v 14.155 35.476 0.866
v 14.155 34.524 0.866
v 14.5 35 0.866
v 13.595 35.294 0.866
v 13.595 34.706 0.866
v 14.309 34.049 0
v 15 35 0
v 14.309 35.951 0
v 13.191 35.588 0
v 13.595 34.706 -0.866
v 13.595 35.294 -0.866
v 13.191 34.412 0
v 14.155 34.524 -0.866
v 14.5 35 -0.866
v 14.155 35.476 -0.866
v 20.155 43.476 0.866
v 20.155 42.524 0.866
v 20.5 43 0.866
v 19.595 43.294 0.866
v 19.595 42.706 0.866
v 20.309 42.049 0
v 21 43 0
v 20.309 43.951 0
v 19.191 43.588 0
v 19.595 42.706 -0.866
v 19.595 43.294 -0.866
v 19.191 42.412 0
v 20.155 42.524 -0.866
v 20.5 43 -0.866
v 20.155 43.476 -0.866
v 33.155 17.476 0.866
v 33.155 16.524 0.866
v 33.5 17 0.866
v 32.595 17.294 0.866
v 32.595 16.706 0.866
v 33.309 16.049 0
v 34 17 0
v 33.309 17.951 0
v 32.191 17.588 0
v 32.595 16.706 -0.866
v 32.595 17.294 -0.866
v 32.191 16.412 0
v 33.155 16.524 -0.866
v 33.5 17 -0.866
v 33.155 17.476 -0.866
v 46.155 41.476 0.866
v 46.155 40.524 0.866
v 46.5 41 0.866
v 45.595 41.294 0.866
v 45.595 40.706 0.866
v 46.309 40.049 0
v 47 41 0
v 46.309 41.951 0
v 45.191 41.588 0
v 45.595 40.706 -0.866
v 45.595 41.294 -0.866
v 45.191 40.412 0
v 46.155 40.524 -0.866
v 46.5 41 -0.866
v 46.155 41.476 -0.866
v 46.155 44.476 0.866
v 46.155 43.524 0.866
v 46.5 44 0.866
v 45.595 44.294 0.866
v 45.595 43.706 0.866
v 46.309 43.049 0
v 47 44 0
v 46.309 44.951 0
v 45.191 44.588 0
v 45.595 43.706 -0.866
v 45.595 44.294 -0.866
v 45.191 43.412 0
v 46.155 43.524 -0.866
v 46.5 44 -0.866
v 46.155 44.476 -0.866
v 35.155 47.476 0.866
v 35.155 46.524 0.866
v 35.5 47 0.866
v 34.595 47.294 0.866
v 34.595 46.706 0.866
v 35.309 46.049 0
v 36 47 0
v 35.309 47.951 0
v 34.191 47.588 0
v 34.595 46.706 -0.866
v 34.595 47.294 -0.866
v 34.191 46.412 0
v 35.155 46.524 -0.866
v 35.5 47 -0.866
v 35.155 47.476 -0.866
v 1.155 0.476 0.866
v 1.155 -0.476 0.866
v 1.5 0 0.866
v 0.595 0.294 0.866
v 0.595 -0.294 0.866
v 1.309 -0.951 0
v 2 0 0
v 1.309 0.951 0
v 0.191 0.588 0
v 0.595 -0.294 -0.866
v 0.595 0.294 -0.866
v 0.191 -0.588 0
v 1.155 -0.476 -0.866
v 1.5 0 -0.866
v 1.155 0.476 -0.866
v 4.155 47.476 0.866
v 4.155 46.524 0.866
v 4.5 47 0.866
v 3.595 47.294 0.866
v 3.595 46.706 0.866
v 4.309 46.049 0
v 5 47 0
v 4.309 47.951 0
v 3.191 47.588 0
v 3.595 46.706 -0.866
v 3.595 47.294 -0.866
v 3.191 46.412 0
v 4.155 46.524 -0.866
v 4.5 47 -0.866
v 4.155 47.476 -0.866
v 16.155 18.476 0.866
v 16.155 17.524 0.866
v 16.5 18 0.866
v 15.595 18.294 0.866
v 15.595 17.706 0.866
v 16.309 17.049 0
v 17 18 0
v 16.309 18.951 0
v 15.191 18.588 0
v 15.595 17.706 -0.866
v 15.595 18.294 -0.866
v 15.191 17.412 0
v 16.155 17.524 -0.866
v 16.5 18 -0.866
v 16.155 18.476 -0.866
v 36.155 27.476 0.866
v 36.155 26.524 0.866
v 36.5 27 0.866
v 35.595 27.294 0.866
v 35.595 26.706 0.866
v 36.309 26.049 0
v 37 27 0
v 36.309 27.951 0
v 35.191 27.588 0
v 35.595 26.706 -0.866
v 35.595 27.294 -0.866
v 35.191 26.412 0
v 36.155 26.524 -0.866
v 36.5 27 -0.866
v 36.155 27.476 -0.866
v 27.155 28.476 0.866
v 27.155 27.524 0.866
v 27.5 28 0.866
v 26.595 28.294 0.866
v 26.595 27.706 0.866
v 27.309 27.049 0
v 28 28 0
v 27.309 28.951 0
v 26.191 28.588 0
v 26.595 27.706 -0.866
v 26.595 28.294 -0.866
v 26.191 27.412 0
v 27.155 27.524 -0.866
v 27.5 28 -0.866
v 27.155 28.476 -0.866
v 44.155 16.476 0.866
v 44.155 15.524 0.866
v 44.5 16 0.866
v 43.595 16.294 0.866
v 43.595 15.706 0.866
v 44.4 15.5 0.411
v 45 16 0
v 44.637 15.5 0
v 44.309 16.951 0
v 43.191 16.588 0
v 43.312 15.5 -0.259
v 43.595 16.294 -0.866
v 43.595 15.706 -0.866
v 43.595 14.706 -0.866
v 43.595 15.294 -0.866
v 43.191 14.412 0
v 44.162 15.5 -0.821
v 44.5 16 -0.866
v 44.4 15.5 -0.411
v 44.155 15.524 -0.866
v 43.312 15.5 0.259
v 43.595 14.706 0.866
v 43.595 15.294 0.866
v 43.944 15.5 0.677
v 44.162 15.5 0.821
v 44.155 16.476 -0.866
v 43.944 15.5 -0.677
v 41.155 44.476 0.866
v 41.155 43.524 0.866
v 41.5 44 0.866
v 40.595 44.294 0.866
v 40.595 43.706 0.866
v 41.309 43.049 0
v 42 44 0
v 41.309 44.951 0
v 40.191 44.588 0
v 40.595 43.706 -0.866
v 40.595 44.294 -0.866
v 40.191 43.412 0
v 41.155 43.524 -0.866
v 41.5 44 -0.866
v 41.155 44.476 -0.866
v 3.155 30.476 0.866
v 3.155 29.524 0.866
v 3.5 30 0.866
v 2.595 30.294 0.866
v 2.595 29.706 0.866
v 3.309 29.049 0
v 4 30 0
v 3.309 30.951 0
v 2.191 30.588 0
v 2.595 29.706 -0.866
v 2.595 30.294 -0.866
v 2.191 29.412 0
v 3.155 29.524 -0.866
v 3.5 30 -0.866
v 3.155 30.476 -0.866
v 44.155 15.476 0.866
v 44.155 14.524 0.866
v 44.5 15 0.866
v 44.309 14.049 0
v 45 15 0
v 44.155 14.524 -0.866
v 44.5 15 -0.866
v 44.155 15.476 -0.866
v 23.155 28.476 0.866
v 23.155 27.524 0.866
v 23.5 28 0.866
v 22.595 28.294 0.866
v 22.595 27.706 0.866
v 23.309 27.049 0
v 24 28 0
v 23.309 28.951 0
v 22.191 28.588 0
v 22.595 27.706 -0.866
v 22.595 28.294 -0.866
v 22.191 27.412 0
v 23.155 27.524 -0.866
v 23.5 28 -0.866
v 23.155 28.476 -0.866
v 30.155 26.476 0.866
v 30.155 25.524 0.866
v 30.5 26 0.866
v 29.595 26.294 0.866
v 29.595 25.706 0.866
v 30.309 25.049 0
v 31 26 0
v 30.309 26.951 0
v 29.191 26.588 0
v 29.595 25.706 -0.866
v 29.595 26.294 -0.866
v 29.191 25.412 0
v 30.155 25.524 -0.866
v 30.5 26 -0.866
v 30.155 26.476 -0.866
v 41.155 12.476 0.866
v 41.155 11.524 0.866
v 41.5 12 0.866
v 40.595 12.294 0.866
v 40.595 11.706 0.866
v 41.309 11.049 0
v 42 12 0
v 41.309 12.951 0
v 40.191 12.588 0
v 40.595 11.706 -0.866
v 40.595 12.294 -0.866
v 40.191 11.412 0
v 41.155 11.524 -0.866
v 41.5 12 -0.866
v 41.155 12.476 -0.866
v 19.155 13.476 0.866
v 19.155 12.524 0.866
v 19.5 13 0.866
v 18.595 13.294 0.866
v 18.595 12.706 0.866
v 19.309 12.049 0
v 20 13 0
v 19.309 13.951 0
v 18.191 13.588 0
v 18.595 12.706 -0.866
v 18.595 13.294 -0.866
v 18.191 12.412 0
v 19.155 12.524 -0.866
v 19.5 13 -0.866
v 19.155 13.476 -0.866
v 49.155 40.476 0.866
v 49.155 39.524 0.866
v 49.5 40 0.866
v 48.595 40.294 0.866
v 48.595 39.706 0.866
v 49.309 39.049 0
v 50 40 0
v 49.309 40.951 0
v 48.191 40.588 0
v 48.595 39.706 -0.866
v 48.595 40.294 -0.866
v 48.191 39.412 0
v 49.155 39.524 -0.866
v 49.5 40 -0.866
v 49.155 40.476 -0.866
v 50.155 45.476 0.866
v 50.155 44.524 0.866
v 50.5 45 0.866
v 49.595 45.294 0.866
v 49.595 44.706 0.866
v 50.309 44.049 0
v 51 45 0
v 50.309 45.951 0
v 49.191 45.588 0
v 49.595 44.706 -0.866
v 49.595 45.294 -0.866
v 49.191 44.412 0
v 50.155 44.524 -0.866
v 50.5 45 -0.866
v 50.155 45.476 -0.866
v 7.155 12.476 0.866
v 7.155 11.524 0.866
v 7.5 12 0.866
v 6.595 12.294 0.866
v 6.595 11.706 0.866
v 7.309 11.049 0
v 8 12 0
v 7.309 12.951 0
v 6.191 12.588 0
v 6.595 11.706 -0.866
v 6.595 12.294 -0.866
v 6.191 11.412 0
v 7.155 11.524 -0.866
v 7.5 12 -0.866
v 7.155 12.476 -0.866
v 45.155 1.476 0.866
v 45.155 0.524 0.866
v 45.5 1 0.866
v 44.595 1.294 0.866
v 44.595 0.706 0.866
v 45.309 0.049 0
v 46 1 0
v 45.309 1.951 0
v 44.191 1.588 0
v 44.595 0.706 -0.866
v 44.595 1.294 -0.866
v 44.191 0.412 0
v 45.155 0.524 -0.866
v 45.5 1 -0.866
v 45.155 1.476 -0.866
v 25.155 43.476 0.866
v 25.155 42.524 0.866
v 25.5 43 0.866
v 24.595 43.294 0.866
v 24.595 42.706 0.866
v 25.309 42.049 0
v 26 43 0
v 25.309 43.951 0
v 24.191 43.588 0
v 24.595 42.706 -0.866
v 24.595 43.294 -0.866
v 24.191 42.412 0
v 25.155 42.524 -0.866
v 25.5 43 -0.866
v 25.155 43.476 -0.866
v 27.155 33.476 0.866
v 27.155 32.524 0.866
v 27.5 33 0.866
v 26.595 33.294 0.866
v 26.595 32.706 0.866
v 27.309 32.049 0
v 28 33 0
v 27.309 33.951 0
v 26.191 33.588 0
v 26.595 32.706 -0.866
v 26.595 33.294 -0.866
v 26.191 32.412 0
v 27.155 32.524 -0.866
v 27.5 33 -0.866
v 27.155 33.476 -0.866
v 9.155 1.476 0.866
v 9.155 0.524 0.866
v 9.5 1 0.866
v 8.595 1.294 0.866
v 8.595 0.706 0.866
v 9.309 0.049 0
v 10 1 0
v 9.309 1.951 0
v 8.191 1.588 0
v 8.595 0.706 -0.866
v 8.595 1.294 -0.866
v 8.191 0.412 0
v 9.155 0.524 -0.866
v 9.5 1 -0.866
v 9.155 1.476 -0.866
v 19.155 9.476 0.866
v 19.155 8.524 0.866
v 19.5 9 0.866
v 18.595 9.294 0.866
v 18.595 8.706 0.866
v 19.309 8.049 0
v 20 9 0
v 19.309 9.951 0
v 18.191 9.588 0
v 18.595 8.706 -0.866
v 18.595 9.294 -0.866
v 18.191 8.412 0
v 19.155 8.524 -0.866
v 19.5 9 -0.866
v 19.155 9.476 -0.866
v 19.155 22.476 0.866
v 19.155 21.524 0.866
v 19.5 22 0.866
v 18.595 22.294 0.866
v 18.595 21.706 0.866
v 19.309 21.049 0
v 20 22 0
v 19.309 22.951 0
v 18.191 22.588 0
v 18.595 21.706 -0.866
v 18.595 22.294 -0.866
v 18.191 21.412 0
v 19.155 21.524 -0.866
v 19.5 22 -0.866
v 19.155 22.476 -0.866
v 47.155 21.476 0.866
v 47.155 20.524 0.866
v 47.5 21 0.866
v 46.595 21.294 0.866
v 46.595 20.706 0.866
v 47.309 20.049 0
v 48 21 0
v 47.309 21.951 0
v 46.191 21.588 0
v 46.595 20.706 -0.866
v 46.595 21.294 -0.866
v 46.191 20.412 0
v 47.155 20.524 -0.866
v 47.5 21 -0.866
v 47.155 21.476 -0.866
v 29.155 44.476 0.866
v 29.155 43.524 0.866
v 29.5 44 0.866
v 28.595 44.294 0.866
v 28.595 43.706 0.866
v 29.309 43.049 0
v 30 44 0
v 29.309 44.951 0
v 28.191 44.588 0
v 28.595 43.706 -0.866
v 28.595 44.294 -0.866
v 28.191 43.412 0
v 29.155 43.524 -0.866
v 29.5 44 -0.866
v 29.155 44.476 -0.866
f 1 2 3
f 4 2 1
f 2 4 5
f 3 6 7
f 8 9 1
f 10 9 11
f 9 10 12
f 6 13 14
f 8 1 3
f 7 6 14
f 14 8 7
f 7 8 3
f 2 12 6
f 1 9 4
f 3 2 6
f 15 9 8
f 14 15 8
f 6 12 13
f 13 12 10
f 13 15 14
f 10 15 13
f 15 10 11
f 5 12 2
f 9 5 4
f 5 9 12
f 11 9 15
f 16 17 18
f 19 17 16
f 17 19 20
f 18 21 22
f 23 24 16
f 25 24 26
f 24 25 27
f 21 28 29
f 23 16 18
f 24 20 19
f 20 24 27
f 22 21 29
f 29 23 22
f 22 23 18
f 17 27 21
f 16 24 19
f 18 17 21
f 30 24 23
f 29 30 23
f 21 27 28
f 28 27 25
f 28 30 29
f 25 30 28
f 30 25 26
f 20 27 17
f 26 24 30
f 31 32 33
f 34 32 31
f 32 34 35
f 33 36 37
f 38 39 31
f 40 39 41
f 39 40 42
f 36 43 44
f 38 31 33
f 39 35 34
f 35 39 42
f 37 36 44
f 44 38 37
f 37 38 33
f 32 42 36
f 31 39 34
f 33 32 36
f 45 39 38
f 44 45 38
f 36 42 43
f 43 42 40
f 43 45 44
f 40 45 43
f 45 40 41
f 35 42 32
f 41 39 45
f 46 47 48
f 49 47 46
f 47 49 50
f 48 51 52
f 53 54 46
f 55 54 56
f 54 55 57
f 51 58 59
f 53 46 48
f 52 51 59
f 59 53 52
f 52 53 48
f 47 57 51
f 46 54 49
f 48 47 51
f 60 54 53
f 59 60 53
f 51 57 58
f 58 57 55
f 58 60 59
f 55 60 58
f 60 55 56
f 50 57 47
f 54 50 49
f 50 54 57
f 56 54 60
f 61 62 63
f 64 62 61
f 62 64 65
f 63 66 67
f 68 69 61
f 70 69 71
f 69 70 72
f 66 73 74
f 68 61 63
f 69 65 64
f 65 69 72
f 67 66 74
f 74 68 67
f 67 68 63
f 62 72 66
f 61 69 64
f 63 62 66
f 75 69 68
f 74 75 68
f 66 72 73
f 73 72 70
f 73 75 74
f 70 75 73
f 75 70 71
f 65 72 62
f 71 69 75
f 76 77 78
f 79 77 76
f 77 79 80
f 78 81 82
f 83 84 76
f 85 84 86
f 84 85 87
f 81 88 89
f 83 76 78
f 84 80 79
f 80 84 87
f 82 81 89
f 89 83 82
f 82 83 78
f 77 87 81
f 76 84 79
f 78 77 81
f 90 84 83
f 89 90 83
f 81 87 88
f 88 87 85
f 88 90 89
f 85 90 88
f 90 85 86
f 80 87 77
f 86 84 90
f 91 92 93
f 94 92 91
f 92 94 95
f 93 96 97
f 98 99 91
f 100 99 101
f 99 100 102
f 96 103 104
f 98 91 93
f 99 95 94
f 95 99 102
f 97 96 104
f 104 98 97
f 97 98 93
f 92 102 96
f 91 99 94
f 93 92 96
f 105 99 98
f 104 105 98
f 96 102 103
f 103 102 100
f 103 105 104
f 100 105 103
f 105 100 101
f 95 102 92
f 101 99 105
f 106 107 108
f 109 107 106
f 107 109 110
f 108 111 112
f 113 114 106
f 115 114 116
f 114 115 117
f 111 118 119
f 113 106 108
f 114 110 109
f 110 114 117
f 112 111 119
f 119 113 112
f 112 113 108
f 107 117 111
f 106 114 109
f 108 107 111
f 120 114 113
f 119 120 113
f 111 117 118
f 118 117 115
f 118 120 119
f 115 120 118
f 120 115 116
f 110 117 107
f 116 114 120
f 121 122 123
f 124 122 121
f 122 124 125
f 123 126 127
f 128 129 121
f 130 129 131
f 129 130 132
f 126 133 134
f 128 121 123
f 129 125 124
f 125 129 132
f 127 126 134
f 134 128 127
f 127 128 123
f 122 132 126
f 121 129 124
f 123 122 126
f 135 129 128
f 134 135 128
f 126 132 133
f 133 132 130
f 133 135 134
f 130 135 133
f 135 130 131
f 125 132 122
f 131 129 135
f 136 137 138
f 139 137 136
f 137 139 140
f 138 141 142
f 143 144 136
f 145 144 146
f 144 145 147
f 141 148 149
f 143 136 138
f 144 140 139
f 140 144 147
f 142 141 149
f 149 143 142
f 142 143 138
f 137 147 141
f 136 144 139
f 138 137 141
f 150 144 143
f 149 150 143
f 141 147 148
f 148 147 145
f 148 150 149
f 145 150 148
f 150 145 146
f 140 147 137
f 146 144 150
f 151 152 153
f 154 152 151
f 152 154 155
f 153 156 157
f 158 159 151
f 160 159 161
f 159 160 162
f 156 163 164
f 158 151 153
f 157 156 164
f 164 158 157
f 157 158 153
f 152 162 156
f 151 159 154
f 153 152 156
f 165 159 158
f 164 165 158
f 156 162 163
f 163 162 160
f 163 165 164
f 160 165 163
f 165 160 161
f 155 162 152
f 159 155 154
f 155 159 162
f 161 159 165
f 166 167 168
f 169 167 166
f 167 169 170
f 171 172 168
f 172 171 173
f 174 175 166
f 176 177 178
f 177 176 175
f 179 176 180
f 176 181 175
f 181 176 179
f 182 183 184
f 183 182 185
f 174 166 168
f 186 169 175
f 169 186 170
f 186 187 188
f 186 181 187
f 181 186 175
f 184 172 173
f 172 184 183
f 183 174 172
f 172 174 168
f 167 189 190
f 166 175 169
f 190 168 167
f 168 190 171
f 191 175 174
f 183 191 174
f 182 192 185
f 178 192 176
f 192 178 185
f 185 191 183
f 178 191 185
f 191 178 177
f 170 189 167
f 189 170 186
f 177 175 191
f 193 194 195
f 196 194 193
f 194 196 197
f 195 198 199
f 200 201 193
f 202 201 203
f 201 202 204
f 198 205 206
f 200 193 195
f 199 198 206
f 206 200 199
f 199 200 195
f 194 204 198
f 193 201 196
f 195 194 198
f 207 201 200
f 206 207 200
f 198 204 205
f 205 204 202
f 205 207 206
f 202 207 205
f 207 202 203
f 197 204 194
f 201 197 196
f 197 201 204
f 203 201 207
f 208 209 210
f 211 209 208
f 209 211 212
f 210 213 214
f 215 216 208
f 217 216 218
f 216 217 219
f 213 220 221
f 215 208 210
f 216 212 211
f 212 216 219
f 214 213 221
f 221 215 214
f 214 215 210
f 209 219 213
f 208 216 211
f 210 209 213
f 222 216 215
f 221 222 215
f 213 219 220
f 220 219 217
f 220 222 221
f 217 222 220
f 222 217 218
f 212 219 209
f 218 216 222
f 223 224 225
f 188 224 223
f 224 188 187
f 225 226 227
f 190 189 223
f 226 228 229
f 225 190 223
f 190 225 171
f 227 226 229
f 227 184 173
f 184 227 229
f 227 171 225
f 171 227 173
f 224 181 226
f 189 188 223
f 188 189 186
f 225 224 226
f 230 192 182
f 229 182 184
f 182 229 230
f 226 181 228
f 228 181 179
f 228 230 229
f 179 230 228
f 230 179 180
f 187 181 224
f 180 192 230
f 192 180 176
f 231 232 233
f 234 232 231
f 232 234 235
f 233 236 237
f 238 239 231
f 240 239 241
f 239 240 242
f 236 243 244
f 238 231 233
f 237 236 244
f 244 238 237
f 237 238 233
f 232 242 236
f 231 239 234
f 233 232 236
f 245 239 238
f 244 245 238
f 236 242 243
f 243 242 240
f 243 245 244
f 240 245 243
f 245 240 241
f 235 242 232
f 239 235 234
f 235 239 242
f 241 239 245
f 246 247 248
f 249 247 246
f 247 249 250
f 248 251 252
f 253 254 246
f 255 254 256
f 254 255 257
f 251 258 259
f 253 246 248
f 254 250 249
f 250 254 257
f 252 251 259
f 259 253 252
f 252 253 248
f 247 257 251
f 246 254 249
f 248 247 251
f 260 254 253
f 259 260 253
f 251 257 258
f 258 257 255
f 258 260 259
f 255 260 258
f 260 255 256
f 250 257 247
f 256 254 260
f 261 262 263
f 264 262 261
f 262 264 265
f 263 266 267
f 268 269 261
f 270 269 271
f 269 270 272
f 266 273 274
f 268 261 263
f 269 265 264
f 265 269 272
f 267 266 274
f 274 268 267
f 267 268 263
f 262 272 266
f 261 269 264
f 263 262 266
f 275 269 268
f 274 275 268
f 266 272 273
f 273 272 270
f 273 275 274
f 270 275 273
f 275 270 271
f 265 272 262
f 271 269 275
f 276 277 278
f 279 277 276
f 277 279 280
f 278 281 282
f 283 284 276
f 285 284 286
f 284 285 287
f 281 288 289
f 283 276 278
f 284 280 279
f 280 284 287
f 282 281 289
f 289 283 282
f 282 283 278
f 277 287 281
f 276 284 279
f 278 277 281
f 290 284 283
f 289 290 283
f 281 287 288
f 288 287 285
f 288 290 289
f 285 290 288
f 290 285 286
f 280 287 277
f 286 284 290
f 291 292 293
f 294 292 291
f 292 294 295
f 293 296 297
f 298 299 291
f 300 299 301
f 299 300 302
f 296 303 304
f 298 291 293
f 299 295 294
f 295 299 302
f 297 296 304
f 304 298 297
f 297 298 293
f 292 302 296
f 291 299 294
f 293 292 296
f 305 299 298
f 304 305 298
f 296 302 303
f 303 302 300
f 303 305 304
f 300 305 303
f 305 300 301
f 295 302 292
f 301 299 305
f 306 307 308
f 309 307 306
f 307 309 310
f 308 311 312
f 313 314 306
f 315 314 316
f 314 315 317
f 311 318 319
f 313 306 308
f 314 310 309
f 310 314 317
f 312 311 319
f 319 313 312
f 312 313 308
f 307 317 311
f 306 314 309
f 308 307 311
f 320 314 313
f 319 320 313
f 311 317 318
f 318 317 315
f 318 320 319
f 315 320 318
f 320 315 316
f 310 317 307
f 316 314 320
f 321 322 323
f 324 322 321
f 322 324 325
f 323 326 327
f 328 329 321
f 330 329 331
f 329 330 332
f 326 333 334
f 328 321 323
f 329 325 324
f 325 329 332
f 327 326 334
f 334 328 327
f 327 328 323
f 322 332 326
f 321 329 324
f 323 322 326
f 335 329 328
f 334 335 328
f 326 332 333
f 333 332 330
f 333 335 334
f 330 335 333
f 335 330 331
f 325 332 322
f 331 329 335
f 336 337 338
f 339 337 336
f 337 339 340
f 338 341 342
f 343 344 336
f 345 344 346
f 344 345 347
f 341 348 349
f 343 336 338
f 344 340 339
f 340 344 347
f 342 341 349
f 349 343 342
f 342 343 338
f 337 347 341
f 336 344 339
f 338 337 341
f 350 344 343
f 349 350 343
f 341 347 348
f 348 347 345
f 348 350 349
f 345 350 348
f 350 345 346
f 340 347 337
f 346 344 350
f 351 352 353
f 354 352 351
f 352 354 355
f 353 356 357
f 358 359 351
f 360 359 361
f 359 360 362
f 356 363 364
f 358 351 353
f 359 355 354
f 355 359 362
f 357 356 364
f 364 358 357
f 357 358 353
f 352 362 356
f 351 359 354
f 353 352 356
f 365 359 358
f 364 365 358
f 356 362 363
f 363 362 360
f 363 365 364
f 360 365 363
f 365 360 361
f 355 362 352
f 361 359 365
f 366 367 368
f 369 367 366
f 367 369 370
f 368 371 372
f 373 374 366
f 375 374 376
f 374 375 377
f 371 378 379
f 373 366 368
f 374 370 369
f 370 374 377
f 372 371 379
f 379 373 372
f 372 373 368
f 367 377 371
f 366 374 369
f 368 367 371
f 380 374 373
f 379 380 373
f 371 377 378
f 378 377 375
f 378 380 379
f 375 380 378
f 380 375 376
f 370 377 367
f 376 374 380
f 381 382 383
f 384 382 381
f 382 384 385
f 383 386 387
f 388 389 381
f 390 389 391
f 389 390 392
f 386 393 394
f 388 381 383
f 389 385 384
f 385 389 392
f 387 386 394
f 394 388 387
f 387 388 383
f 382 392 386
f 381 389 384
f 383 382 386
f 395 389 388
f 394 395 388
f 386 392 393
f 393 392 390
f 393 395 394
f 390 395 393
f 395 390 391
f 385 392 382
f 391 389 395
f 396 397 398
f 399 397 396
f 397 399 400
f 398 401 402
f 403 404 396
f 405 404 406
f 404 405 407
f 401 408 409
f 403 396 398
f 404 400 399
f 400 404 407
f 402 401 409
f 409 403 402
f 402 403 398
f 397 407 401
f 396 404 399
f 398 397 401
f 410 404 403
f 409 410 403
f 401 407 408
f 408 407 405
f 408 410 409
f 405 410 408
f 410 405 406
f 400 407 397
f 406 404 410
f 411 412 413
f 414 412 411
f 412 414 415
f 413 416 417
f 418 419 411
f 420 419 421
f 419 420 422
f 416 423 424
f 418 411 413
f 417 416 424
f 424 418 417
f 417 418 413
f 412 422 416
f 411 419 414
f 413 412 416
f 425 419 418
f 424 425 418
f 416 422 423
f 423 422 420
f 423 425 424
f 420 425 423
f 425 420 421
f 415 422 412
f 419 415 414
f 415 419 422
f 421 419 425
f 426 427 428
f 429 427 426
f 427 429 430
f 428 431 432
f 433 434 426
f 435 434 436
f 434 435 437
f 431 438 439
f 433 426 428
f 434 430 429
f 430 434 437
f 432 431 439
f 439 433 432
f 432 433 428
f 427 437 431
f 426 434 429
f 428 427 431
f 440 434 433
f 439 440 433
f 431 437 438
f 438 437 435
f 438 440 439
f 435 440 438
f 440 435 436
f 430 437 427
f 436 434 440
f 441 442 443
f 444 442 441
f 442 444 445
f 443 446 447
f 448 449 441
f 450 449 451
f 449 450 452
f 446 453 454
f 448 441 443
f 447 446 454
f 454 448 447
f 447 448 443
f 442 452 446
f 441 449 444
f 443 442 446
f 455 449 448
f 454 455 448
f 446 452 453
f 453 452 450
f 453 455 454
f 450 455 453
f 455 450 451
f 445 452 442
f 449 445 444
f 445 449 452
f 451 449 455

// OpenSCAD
//Delaunay 

// circular linked list 
//---------------------------------------------------
function next_node(index,init_num,count_num,array)=
     let(head=0)
     let(end=len(array)-1)
     count_num>=index? init_num:
     init_num==end?
     next_node(index,head,count_num+1,array):  
     next_node(index,init_num+1,count_num+1,array);
     
function linked_list(index,array)=
     let(init_num=0)
     let(count_num=0) 
     next_node(index,init_num,count_num,array);
     
//---------------------------------------------------     
function next_node_(index,init_num,count_num,array)=
     let(head=len(array)-1)
     let(end=0)
     count_num>=index? init_num:
     init_num==end?
     next_node_(index,head,count_num+1,array):
     next_node_(index,init_num-1,count_num+1,array);
     
function linked_list_(index,array)=
     let(init_num=len(array)-1)
     let(count_num=0)
     next_node_(index,init_num,count_num,array);
     
//--------------------------------------------------     
    
    
function list(init_num,array)=
       let(index=0)
       let(num=array[index][linked_list(init_num,array)])
       list_inner(index+1,init_num+1,num,array);    
function list_inner(index,init_num,num,array)=     
       let(leng=len(array))
       index==leng?num:
       let(num_=num*array[index][linked_list(init_num,array)])
       list_inner(index+1,init_num+1,num_,array);

//------------------------------------------------------------------
function list_(init_num,array)=
      let(index=0)
      let(num=array[index][linked_list_(init_num,array)])
      list_inner_(index+1,init_num+1,num,array);
function list_inner_(index,init_num,num,array)=
      let(leng=len(array))
      index==leng?num:
      let(num_=num*array[index][linked_list_(init_num,array)]) 
      list_inner_(index+1,init_num+1,num_,array);
      
    
//--------------------------------------------------------------------        
function sum(list)=
      let(leng=len(list))
      leng==1?list[0]:
      leng==2?list[0]+list[1]:
      let( 
          sum_first=list[0]+list[1],
          sum_after=[for(i=[2:leng-1])
              list[i]])    
      sum(concat(sum_first,sum_after));
          

function determinant(array)=
     let(stairs=len(array)-1)
     let(sum1=sum([for(i=[0:stairs]) list(i,array)]))
     let(sum2=sum([for(i=[0:stairs])list_(i,array)]))
    sum1-sum2; 
    
    
function circumcenter(x1,y1,x2,y2,x3,y3)=
      let(x=determinant([[pow(x1,2)+pow(y1,2),y1,1],
                    [pow(x2,2)+pow(y2,2),y2,1],
                    [pow(x3,2)+pow(y3,2),y3,1]])/(2*
        determinant([[x1,y1,1],
                     [x2,y2,1],
                     [x3,y3,1]]))     
         )
      let(y=determinant([[x1,pow(x1,2)+pow(y1,2),1],
                         [x2,pow(x2,2)+pow(y2,2),1],
                         [x3,pow(x3,2)+pow(y3,2),1] 
                         ])/(2*
            determinant([[x1,y1,1],
                         [x2,y2,1],
                         [x3,y3,1]])))
      [x,y];
     
     

echo(circumcenter(0,0,1,5,10,0));

      
      
      
function rnd_v(init_value,end_value)=round(rands(init_value,end_value,1)[0]);      
      
function rnd_points(width,length,amount)=
     [for(i=[0:amount-1])
        [rnd_v(0,width),rnd_v(0,length)]];
     
     
     
for (i=rnd_points(50,50,30)) 
      translate(i)
          sphere(1);
         
 /*     
function delaunay(rnd_points)=
*/


 
      
      
      
      
      
      
      
 
      
      
      
      
      
      
      
      
      
      
      
      
      
      
      
      
      
      
      
      
      
      
      
